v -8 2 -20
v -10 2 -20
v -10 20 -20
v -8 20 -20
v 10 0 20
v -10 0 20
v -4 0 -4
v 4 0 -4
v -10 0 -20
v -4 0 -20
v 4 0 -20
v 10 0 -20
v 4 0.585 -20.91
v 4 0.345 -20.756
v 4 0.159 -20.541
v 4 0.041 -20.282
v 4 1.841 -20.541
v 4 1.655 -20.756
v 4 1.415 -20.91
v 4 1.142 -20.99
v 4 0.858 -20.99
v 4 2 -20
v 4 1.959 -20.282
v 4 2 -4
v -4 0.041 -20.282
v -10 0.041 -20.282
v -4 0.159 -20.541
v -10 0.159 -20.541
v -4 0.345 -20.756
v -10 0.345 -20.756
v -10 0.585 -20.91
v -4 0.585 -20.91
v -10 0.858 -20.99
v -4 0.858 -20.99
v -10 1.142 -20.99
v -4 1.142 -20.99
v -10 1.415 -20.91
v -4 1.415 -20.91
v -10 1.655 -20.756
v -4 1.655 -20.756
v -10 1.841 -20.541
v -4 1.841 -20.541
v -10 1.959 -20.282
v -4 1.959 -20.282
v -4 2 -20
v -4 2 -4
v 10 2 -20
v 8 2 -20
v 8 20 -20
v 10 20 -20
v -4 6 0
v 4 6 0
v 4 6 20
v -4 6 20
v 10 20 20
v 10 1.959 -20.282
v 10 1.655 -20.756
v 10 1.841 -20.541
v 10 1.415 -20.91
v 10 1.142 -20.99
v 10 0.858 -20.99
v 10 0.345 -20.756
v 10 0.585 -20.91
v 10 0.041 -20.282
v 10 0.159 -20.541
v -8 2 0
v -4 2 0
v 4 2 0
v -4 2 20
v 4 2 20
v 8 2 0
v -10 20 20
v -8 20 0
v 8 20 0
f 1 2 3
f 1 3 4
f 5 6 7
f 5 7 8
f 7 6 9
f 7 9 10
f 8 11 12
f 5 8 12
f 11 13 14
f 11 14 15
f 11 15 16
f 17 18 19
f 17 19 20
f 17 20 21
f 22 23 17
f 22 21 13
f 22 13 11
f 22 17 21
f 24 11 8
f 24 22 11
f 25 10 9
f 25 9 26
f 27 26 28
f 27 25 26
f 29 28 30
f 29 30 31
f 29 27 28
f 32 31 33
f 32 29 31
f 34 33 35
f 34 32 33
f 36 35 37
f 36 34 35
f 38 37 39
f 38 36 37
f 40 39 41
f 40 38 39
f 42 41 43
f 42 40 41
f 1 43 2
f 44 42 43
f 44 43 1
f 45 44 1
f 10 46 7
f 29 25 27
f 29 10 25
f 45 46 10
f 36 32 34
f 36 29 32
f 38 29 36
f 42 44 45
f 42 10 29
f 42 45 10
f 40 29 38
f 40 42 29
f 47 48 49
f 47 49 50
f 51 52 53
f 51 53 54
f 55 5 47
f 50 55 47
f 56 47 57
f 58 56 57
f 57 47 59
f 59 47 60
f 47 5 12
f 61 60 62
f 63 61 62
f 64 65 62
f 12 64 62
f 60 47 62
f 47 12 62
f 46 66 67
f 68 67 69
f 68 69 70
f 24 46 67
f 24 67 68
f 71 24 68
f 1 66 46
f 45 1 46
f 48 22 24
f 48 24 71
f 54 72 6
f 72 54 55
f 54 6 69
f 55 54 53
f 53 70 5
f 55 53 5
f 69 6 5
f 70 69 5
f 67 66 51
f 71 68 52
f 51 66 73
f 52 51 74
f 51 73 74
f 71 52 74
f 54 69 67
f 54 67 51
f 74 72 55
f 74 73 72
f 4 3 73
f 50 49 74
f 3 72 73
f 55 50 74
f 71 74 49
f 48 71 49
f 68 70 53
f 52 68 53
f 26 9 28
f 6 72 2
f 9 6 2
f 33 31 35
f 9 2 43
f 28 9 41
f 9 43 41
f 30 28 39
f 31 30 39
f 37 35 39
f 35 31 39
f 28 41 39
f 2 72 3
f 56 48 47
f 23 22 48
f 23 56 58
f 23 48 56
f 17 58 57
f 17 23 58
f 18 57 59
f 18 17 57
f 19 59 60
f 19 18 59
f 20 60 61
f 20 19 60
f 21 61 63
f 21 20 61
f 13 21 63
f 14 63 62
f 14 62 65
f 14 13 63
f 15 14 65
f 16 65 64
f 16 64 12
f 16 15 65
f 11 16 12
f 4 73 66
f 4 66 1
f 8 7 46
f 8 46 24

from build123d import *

# Parameters (mm, degrees)
SKETCH_1_W          = 20
SKETCH_1_H          = 40
EXTRUDE_1_DEPTH     = 20
SKETCH_2_W          = 16
SKETCH_2_H          = 20
CUT_EXTRUDE_1_DEPTH = 18
SKETCH_3_W          = 8
SKETCH_3_H          = 38.402735184
CUT_EXTRUDE_2_DEPTH = 20
SKETCH_4_R          = 1
EXTRUDE_2_DEPTH     = 6
SKETCH_5_R          = 1
EXTRUDE_3_DEPTH     = 6
SKETCH_6_W          = 8
SKETCH_6_H          = 4
CUT_EXTRUDE_3_DEPTH = 30


with BuildPart() as part:
    # 草图1 → 凸台-拉伸1 (new body)
    with BuildSketch(Plane(origin=(0, 0, 0), x_dir=(1, 0, 0), z_dir=(0, 1, 0))):
        Rectangle(SKETCH_1_W, SKETCH_1_H)
    extrude(amount=EXTRUDE_1_DEPTH)

    # 草图2 → 切除-拉伸1 (cut)
    with BuildSketch(Plane(origin=(0, 20, 0), x_dir=(1, 0, 0), z_dir=(0, 1, 0))):
        with Locations((0, 10)):
            Rectangle(SKETCH_2_W, SKETCH_2_H)
    extrude(amount=-CUT_EXTRUDE_1_DEPTH, mode=Mode.SUBTRACT)

    # 草图3 → 切除-拉伸2 (cut)
    with BuildSketch(Plane.XZ):
        with Locations((0, -23.201367592)):
            Rectangle(SKETCH_3_W, SKETCH_3_H)
    extrude(amount=-CUT_EXTRUDE_2_DEPTH, mode=Mode.SUBTRACT)

    # 草图4 → 凸台-拉伸2 (add)
    with BuildSketch(Plane(origin=(-4, 0, 0), x_dir=(0, 0, -1), z_dir=(1, 0, 0))):
        with Locations((20, 1)):
            Circle(SKETCH_4_R)
    extrude(amount=-EXTRUDE_2_DEPTH)

    # 草图5 → 凸台-拉伸3 (add)
    with BuildSketch(Plane.ZY.offset(-4)):
        with Locations((-20, 1)):
            Circle(SKETCH_5_R)
    extrude(amount=-EXTRUDE_3_DEPTH)

    # 草图6 → 切除-拉伸3 (cut)
    with BuildSketch(Plane(origin=(0, 0, 0), x_dir=(-1, 0, 0), z_dir=(0, 0, -1))):
        with Locations((0, 4)):
            Rectangle(SKETCH_6_W, SKETCH_6_H)
    extrude(amount=-CUT_EXTRUDE_3_DEPTH, mode=Mode.SUBTRACT)


solid = part.part
